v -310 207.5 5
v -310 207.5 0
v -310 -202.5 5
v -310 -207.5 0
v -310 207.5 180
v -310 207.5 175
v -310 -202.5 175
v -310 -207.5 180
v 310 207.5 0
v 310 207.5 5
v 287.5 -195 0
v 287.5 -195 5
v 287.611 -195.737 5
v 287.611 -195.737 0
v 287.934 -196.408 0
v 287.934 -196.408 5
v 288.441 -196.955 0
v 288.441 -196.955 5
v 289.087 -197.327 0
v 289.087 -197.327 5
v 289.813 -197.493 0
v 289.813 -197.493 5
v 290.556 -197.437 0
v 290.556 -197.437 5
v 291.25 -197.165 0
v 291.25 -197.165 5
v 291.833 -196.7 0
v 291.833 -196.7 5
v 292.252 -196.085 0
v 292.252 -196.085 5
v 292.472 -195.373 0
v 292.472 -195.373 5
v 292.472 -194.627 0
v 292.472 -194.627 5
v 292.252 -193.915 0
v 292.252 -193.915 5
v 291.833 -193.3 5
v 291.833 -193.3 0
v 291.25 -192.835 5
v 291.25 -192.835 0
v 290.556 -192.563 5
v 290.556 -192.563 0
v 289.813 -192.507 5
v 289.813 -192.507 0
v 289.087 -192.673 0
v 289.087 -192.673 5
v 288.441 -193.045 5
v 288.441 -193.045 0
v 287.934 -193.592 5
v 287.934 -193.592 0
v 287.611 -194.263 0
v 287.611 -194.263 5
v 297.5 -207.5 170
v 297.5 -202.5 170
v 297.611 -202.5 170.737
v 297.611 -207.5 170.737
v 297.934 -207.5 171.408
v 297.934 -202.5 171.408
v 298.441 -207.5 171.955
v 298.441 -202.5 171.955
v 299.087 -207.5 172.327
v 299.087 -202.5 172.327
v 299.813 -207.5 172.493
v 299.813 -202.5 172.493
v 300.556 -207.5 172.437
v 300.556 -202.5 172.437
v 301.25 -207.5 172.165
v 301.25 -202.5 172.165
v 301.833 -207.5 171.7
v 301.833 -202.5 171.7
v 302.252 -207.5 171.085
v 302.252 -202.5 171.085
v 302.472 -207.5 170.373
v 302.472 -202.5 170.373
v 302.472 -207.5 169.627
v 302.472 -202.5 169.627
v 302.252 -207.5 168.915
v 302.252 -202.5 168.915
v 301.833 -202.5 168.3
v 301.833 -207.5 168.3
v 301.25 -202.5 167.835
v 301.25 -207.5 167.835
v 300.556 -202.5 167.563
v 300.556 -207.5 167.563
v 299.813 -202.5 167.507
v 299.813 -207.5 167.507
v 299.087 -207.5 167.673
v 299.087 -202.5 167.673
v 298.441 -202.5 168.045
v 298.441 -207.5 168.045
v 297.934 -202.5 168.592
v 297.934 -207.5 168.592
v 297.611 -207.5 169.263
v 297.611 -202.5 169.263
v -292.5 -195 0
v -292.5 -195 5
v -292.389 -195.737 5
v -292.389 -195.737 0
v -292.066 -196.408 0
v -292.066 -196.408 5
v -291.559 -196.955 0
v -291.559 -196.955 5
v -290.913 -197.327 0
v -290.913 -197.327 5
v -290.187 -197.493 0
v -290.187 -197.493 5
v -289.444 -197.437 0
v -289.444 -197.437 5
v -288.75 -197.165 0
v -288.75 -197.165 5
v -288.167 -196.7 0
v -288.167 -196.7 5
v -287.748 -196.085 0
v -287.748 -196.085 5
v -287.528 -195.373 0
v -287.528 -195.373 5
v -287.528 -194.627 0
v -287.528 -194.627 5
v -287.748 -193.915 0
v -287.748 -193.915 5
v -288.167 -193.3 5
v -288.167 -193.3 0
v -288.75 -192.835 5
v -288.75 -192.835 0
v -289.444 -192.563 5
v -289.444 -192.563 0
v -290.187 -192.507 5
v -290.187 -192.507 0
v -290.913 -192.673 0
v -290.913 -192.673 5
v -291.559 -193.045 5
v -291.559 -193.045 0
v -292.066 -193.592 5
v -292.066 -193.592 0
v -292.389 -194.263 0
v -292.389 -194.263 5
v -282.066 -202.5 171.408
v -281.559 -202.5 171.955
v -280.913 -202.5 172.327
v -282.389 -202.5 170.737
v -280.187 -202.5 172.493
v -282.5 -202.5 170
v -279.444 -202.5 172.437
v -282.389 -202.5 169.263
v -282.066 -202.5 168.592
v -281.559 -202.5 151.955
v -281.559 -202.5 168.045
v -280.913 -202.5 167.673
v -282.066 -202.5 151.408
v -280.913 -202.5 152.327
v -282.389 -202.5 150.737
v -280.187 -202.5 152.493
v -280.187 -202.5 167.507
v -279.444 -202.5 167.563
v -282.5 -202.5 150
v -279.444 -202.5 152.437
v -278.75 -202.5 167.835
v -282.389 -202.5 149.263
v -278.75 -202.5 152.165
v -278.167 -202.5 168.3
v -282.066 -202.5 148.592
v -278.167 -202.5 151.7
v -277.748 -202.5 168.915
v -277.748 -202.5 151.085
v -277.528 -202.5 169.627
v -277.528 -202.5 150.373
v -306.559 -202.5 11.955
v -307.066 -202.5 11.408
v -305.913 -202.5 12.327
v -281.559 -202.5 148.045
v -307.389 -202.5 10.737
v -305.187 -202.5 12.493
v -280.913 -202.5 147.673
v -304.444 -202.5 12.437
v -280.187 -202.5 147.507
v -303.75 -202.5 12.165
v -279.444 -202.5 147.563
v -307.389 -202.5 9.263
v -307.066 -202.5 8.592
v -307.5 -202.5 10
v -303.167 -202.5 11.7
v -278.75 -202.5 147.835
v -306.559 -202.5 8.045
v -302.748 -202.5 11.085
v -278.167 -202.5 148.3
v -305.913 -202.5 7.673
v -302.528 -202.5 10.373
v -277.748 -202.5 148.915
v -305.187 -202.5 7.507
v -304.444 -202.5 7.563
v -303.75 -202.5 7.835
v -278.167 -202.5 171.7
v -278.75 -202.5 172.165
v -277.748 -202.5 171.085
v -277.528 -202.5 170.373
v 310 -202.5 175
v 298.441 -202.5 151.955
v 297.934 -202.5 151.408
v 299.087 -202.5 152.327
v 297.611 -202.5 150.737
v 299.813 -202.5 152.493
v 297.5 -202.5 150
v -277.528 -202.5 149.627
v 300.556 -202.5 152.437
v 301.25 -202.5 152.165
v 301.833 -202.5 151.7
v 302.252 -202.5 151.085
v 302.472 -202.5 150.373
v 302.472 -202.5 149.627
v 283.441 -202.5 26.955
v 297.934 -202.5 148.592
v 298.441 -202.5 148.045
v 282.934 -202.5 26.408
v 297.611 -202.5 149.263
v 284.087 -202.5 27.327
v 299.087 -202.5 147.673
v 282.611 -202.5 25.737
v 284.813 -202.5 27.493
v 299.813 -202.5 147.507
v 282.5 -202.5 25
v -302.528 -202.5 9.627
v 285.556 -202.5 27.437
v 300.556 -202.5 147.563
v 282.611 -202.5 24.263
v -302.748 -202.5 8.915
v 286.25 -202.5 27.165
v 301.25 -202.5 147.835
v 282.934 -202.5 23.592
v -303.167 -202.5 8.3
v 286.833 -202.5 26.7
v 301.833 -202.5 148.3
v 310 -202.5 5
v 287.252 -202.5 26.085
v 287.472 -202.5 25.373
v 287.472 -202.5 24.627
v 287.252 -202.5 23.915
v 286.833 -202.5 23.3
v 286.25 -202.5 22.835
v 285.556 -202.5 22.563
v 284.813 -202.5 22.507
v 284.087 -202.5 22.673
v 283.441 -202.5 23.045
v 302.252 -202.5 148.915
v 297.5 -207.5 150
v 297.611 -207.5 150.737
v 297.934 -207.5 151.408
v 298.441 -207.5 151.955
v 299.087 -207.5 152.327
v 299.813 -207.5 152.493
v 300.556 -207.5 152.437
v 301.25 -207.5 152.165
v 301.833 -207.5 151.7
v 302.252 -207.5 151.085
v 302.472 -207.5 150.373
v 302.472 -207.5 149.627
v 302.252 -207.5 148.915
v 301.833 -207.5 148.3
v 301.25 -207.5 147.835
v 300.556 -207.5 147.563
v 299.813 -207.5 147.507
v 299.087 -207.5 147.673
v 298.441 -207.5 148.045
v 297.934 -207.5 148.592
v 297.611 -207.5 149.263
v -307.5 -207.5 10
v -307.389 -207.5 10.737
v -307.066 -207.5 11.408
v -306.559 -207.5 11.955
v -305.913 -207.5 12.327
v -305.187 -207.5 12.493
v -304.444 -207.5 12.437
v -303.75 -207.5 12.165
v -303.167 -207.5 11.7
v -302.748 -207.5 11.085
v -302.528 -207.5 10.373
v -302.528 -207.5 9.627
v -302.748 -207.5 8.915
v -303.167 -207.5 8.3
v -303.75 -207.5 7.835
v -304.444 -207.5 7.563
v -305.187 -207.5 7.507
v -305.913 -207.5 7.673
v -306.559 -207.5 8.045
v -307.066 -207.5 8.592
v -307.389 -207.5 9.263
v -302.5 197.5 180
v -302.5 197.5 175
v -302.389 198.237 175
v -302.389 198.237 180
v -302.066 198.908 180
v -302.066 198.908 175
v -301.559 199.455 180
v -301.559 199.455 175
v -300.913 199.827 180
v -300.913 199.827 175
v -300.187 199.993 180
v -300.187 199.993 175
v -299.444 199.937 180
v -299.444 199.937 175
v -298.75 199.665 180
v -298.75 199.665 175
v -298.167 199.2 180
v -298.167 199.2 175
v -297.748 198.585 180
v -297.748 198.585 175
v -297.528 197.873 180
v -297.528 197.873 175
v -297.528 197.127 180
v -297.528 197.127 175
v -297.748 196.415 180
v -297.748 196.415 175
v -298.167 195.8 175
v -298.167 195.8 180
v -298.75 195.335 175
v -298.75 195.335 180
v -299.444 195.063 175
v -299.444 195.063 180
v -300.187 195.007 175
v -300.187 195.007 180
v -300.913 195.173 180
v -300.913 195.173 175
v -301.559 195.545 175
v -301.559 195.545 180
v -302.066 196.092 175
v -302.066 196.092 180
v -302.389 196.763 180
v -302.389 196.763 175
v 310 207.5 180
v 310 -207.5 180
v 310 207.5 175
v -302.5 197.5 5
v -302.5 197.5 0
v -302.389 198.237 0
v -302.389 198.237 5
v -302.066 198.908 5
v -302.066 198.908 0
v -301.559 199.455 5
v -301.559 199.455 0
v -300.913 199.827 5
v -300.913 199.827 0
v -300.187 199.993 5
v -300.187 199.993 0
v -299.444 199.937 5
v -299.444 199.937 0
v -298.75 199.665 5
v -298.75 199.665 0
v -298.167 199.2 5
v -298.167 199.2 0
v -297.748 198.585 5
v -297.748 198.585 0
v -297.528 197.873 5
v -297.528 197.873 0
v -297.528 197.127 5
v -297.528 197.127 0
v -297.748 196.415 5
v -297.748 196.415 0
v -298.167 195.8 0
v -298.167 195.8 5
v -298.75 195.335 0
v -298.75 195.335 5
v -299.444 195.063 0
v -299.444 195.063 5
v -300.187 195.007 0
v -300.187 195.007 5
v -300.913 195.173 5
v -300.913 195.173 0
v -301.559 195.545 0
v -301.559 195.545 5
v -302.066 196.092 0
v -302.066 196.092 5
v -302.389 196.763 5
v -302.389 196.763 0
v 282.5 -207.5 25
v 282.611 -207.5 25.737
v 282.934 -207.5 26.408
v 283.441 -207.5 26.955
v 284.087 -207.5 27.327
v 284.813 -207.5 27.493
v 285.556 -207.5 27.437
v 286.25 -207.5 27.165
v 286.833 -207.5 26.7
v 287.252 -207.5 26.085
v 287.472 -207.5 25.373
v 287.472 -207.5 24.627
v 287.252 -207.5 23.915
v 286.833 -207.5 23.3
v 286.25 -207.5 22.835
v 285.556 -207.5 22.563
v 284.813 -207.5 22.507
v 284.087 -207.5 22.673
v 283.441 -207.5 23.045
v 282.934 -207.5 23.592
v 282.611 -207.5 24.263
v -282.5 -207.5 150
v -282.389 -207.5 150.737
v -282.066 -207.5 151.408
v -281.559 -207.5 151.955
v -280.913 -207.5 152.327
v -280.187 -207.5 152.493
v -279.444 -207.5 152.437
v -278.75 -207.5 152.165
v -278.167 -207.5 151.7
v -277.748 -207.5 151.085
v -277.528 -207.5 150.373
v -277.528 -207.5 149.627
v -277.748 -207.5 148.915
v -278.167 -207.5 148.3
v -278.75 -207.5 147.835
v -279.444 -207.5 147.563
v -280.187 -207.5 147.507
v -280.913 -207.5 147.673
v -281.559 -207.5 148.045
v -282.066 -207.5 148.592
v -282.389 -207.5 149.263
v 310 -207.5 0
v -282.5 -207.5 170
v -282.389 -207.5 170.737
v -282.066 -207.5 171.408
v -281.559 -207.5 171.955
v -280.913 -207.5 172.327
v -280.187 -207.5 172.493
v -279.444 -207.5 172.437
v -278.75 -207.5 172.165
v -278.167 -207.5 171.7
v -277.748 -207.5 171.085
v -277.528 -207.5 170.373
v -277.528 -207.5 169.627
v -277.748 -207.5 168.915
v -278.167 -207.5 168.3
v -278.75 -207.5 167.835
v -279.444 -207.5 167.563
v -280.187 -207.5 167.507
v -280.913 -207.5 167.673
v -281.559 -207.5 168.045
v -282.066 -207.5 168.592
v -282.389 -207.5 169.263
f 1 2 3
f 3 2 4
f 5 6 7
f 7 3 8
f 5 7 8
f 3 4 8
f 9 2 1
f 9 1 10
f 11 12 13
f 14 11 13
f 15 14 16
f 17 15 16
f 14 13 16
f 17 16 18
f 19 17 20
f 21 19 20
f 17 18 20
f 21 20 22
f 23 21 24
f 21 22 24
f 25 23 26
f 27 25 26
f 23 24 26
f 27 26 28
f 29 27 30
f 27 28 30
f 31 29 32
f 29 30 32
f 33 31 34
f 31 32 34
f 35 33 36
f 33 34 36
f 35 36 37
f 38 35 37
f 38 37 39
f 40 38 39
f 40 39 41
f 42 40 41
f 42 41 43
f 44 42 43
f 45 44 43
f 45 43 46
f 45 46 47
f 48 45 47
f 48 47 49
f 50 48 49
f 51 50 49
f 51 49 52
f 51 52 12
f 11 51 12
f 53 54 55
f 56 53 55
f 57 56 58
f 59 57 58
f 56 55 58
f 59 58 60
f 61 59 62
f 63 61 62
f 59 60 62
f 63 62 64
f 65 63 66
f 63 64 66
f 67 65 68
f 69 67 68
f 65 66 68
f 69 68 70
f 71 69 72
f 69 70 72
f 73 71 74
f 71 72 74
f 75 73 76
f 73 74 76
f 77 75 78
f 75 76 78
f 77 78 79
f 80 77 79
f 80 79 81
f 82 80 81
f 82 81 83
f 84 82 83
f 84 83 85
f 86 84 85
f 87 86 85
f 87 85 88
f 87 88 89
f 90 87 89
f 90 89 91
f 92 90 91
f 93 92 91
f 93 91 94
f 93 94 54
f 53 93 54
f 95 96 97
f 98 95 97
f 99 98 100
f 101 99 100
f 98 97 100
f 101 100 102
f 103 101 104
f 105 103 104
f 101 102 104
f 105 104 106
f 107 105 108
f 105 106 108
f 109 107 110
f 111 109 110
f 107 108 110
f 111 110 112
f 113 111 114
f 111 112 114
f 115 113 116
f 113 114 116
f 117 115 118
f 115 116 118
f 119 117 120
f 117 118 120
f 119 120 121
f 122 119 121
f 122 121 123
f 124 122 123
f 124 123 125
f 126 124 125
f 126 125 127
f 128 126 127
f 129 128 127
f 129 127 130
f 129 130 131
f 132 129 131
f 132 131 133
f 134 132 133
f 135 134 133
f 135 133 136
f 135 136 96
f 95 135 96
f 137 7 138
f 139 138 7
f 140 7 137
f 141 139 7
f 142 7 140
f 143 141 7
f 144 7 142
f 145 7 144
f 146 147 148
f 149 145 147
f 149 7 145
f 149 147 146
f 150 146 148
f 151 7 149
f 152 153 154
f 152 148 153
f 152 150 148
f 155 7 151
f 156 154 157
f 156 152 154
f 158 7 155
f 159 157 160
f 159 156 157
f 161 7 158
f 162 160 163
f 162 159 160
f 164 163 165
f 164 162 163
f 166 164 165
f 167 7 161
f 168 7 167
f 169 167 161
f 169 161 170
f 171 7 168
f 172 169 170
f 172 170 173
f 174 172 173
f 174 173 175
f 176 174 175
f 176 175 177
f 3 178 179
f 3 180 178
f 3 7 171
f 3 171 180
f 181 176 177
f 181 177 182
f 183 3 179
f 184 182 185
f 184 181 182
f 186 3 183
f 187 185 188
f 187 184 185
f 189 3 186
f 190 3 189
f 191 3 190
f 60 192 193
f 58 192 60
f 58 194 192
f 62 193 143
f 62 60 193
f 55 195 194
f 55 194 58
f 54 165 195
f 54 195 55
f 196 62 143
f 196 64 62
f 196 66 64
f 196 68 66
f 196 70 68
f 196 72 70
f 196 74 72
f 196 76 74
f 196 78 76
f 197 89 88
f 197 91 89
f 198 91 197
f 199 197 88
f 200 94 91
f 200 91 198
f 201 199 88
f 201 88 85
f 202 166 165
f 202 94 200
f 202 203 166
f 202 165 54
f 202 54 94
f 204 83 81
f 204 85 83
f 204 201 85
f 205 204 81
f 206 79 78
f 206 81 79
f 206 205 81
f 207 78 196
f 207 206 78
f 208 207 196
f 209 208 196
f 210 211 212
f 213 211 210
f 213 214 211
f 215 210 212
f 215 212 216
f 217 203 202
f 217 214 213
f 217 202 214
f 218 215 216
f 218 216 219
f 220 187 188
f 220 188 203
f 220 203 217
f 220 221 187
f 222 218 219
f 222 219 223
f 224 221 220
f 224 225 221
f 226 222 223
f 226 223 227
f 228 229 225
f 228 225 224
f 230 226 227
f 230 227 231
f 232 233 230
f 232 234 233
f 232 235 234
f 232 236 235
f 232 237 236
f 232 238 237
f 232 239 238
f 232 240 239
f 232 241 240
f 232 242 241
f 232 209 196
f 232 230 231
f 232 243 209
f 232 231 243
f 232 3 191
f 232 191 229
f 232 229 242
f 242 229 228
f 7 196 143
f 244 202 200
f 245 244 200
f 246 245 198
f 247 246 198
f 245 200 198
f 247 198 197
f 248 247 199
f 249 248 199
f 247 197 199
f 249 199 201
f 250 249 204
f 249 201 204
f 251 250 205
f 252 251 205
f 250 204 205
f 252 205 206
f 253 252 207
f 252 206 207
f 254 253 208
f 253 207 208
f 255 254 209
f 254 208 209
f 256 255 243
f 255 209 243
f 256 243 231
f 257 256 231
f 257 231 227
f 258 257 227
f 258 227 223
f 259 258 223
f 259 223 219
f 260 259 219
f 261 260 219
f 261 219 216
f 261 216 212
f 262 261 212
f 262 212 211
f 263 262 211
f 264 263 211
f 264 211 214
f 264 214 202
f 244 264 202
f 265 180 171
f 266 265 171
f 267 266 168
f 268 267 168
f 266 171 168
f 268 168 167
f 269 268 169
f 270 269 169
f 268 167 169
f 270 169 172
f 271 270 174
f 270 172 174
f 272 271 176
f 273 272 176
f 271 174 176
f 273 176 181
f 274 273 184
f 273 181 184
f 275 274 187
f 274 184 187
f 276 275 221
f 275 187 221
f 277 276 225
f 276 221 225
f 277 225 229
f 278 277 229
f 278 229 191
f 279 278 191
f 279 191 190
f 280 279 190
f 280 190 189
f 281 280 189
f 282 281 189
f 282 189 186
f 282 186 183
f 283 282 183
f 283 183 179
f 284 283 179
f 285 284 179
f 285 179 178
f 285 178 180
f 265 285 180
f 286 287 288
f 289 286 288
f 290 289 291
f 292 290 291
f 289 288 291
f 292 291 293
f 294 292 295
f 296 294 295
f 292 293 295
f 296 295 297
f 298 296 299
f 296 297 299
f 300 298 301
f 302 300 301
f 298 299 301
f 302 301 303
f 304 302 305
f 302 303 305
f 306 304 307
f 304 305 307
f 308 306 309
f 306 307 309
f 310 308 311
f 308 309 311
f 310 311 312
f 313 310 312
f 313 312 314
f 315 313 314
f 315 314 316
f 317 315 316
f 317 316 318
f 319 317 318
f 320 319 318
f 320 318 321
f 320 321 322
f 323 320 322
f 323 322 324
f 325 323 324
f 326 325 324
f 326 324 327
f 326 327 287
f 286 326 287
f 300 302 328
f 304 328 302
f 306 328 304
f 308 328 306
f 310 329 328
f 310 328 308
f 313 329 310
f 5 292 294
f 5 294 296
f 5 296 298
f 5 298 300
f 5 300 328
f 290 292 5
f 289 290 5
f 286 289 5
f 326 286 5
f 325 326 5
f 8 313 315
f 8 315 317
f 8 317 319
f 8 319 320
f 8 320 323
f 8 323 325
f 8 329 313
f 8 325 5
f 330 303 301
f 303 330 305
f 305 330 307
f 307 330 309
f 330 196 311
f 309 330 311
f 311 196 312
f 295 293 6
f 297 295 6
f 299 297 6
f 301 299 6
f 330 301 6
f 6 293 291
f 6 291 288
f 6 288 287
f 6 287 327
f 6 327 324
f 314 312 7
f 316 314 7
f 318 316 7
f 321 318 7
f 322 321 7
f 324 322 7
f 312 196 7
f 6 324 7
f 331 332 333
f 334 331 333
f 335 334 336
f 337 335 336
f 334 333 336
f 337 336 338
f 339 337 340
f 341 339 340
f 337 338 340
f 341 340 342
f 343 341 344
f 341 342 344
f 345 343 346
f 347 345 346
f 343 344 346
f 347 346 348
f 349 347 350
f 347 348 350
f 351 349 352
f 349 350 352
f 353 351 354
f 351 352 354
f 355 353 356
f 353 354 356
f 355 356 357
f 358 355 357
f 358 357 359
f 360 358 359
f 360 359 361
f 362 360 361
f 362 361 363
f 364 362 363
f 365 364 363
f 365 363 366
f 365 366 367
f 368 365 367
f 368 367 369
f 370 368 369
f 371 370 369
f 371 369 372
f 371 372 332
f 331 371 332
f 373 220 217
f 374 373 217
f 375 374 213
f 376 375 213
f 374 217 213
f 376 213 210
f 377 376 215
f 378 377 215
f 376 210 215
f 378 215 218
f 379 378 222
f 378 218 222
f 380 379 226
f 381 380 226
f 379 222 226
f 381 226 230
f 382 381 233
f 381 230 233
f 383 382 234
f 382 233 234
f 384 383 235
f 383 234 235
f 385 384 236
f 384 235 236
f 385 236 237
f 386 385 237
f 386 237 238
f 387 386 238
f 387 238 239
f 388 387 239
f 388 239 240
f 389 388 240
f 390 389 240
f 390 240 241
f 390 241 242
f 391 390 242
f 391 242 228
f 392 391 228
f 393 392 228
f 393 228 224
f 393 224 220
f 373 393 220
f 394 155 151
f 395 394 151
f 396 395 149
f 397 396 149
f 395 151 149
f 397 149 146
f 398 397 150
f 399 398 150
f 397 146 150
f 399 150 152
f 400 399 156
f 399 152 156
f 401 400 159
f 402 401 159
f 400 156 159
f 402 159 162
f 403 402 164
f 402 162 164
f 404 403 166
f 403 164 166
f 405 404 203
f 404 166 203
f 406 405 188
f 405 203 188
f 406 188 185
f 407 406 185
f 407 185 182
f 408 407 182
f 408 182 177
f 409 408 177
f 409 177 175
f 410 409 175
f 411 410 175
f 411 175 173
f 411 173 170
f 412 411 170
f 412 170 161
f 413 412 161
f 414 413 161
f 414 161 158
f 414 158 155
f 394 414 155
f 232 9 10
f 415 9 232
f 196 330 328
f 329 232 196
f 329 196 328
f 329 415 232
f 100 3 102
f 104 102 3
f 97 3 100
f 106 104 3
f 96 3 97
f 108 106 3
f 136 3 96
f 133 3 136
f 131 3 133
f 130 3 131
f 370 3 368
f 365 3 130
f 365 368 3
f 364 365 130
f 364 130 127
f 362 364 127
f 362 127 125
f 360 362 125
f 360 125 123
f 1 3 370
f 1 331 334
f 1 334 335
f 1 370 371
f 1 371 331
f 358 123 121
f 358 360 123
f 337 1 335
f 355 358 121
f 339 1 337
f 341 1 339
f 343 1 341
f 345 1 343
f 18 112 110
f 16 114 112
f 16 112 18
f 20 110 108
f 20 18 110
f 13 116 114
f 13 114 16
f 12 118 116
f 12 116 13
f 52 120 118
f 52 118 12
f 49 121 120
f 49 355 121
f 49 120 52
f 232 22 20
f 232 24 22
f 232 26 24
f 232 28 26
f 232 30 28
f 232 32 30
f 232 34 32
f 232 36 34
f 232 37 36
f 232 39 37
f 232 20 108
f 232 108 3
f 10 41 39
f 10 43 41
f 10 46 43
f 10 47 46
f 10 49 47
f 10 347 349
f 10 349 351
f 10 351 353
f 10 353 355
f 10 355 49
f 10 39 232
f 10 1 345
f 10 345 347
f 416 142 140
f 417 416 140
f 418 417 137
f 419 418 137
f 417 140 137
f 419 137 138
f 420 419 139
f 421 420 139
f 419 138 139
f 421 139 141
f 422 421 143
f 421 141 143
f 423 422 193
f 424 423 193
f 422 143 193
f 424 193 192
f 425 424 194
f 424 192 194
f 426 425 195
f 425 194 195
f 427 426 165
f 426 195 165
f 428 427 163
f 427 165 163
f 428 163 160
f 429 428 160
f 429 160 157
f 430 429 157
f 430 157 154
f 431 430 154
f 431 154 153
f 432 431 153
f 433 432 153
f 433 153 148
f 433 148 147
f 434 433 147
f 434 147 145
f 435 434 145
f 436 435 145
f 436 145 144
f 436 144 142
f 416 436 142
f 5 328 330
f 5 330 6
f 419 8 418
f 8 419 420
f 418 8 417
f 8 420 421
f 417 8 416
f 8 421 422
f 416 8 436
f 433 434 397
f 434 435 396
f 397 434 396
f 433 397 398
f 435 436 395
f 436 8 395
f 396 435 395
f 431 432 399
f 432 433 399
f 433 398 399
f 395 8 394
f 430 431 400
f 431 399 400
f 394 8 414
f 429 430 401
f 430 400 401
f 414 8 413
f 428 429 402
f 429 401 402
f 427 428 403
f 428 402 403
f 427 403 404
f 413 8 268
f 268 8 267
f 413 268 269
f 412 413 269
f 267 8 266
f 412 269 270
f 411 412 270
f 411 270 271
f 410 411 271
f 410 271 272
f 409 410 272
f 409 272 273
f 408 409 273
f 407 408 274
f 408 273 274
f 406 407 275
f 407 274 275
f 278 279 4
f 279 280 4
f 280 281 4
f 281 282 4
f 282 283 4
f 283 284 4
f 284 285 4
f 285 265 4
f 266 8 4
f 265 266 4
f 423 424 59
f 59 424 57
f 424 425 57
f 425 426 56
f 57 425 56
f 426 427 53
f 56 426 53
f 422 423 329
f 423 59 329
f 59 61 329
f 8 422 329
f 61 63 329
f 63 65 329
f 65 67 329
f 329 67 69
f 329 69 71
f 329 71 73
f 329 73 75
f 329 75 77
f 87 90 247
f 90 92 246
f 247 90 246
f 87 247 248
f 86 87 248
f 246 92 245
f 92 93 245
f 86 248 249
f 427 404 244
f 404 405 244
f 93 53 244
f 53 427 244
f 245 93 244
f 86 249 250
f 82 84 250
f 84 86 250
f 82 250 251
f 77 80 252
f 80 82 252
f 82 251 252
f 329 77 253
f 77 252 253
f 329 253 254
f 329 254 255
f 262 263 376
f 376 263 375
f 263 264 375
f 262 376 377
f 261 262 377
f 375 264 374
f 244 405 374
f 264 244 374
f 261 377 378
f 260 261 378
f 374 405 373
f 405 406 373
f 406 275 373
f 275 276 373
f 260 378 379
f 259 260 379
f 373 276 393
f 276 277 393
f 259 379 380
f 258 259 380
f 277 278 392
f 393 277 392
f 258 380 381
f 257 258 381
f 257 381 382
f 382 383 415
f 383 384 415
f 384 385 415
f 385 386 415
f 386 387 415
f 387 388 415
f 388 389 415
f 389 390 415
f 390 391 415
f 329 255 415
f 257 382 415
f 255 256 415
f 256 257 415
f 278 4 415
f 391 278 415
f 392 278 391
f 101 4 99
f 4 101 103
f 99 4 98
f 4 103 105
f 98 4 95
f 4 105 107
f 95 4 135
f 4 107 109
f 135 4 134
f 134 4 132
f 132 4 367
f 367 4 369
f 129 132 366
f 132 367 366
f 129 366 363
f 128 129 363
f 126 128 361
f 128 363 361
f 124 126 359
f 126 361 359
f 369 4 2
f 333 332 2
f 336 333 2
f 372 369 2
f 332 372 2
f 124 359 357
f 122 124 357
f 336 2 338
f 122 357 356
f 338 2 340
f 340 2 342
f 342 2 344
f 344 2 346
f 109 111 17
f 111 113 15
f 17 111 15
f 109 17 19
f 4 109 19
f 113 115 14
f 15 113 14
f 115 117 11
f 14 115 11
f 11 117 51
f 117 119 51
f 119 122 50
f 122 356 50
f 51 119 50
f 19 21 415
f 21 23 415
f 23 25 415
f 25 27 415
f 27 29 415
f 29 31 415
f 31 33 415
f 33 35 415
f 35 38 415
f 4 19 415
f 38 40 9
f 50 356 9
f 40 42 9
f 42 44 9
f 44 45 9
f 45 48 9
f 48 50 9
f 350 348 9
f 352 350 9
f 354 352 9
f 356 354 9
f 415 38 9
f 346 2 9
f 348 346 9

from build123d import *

# Parameters (mm, degrees)
F0_W      = 620
F0_H      = 415
F1_DEPTH  = 5
F2_W      = 620
F2_H      = 5
F3_DEPTH  = 175
F5_D      = 5
F7_D      = 5
F9_D      = 5
F11_D     = 5
F13_D     = 5
F15_D     = 5
F17_D     = 5
F19_D     = 5
F19_DEPTH = 11
F20_W     = 620
F20_H     = 5
F21_DEPTH = 410
F23_D     = 5


with BuildPart() as f1:
    # F0 (on Top) → F1 (new body)
    with BuildSketch(Plane.XY):
        Rectangle(F0_W, F0_H)
    extrude(amount=F1_DEPTH)

    # F2 (on face) → F3 (join)
    with BuildSketch(Plane.XY.offset(5)):
        with Locations((0, -205)):
            Rectangle(F2_W, F2_H)
    extrude(amount=F3_DEPTH)

    # F5 (through all)
    with Locations(Plane.XZ.offset(207.5)):
        with Locations((300, 170)):
            Hole(F5_D / 2)

    # F7 (through all)
    with Locations(Plane.XZ.offset(207.5)):
        with Locations((300, 150)):
            Hole(F7_D / 2)

    # F9 (through all)
    with Locations(Plane.XZ.offset(207.5)):
        with Locations((-280, 170)):
            Hole(F9_D / 2)

    # F11 (through all)
    with Locations(Plane.XZ.offset(207.5)):
        with Locations((-280, 150)):
            Hole(F11_D / 2)

    # F13 (through all)
    with Locations(Plane.XZ.offset(207.5)):
        with Locations((-305, 10)):
            Hole(F13_D / 2)

    # F15 (through all)
    with Locations(Plane(origin=(0, 0, 0), x_dir=(1, 0, 0), z_dir=(0, 0, -1))):
        with Locations((290, 195)):
            Hole(F15_D / 2)

    # F17 (through all)
    with Locations(Plane(origin=(0, 0, 0), x_dir=(1, 0, 0), z_dir=(0, 0, -1))):
        with Locations((-290, 195)):
            Hole(F17_D / 2)

    # F19
    with Locations(Plane.XZ.offset(207.5)):
        with Locations((285, 25)):
            Hole(F19_D / 2, depth=F19_DEPTH)

    # F20 (on face) → F21 (join)
    with BuildSketch(Plane(origin=(0, -202.5, 0), x_dir=(-1, 0, 0), z_dir=(0, 1, 0))):
        with Locations((0, 177.5)):
            Rectangle(F20_W, F20_H)
    extrude(amount=F21_DEPTH)

    # F23 (through all)
    with Locations(Plane.XY.offset(180)):
        with Locations((-300, 197.5)):
            Hole(F23_D / 2)


solid = f1.part
